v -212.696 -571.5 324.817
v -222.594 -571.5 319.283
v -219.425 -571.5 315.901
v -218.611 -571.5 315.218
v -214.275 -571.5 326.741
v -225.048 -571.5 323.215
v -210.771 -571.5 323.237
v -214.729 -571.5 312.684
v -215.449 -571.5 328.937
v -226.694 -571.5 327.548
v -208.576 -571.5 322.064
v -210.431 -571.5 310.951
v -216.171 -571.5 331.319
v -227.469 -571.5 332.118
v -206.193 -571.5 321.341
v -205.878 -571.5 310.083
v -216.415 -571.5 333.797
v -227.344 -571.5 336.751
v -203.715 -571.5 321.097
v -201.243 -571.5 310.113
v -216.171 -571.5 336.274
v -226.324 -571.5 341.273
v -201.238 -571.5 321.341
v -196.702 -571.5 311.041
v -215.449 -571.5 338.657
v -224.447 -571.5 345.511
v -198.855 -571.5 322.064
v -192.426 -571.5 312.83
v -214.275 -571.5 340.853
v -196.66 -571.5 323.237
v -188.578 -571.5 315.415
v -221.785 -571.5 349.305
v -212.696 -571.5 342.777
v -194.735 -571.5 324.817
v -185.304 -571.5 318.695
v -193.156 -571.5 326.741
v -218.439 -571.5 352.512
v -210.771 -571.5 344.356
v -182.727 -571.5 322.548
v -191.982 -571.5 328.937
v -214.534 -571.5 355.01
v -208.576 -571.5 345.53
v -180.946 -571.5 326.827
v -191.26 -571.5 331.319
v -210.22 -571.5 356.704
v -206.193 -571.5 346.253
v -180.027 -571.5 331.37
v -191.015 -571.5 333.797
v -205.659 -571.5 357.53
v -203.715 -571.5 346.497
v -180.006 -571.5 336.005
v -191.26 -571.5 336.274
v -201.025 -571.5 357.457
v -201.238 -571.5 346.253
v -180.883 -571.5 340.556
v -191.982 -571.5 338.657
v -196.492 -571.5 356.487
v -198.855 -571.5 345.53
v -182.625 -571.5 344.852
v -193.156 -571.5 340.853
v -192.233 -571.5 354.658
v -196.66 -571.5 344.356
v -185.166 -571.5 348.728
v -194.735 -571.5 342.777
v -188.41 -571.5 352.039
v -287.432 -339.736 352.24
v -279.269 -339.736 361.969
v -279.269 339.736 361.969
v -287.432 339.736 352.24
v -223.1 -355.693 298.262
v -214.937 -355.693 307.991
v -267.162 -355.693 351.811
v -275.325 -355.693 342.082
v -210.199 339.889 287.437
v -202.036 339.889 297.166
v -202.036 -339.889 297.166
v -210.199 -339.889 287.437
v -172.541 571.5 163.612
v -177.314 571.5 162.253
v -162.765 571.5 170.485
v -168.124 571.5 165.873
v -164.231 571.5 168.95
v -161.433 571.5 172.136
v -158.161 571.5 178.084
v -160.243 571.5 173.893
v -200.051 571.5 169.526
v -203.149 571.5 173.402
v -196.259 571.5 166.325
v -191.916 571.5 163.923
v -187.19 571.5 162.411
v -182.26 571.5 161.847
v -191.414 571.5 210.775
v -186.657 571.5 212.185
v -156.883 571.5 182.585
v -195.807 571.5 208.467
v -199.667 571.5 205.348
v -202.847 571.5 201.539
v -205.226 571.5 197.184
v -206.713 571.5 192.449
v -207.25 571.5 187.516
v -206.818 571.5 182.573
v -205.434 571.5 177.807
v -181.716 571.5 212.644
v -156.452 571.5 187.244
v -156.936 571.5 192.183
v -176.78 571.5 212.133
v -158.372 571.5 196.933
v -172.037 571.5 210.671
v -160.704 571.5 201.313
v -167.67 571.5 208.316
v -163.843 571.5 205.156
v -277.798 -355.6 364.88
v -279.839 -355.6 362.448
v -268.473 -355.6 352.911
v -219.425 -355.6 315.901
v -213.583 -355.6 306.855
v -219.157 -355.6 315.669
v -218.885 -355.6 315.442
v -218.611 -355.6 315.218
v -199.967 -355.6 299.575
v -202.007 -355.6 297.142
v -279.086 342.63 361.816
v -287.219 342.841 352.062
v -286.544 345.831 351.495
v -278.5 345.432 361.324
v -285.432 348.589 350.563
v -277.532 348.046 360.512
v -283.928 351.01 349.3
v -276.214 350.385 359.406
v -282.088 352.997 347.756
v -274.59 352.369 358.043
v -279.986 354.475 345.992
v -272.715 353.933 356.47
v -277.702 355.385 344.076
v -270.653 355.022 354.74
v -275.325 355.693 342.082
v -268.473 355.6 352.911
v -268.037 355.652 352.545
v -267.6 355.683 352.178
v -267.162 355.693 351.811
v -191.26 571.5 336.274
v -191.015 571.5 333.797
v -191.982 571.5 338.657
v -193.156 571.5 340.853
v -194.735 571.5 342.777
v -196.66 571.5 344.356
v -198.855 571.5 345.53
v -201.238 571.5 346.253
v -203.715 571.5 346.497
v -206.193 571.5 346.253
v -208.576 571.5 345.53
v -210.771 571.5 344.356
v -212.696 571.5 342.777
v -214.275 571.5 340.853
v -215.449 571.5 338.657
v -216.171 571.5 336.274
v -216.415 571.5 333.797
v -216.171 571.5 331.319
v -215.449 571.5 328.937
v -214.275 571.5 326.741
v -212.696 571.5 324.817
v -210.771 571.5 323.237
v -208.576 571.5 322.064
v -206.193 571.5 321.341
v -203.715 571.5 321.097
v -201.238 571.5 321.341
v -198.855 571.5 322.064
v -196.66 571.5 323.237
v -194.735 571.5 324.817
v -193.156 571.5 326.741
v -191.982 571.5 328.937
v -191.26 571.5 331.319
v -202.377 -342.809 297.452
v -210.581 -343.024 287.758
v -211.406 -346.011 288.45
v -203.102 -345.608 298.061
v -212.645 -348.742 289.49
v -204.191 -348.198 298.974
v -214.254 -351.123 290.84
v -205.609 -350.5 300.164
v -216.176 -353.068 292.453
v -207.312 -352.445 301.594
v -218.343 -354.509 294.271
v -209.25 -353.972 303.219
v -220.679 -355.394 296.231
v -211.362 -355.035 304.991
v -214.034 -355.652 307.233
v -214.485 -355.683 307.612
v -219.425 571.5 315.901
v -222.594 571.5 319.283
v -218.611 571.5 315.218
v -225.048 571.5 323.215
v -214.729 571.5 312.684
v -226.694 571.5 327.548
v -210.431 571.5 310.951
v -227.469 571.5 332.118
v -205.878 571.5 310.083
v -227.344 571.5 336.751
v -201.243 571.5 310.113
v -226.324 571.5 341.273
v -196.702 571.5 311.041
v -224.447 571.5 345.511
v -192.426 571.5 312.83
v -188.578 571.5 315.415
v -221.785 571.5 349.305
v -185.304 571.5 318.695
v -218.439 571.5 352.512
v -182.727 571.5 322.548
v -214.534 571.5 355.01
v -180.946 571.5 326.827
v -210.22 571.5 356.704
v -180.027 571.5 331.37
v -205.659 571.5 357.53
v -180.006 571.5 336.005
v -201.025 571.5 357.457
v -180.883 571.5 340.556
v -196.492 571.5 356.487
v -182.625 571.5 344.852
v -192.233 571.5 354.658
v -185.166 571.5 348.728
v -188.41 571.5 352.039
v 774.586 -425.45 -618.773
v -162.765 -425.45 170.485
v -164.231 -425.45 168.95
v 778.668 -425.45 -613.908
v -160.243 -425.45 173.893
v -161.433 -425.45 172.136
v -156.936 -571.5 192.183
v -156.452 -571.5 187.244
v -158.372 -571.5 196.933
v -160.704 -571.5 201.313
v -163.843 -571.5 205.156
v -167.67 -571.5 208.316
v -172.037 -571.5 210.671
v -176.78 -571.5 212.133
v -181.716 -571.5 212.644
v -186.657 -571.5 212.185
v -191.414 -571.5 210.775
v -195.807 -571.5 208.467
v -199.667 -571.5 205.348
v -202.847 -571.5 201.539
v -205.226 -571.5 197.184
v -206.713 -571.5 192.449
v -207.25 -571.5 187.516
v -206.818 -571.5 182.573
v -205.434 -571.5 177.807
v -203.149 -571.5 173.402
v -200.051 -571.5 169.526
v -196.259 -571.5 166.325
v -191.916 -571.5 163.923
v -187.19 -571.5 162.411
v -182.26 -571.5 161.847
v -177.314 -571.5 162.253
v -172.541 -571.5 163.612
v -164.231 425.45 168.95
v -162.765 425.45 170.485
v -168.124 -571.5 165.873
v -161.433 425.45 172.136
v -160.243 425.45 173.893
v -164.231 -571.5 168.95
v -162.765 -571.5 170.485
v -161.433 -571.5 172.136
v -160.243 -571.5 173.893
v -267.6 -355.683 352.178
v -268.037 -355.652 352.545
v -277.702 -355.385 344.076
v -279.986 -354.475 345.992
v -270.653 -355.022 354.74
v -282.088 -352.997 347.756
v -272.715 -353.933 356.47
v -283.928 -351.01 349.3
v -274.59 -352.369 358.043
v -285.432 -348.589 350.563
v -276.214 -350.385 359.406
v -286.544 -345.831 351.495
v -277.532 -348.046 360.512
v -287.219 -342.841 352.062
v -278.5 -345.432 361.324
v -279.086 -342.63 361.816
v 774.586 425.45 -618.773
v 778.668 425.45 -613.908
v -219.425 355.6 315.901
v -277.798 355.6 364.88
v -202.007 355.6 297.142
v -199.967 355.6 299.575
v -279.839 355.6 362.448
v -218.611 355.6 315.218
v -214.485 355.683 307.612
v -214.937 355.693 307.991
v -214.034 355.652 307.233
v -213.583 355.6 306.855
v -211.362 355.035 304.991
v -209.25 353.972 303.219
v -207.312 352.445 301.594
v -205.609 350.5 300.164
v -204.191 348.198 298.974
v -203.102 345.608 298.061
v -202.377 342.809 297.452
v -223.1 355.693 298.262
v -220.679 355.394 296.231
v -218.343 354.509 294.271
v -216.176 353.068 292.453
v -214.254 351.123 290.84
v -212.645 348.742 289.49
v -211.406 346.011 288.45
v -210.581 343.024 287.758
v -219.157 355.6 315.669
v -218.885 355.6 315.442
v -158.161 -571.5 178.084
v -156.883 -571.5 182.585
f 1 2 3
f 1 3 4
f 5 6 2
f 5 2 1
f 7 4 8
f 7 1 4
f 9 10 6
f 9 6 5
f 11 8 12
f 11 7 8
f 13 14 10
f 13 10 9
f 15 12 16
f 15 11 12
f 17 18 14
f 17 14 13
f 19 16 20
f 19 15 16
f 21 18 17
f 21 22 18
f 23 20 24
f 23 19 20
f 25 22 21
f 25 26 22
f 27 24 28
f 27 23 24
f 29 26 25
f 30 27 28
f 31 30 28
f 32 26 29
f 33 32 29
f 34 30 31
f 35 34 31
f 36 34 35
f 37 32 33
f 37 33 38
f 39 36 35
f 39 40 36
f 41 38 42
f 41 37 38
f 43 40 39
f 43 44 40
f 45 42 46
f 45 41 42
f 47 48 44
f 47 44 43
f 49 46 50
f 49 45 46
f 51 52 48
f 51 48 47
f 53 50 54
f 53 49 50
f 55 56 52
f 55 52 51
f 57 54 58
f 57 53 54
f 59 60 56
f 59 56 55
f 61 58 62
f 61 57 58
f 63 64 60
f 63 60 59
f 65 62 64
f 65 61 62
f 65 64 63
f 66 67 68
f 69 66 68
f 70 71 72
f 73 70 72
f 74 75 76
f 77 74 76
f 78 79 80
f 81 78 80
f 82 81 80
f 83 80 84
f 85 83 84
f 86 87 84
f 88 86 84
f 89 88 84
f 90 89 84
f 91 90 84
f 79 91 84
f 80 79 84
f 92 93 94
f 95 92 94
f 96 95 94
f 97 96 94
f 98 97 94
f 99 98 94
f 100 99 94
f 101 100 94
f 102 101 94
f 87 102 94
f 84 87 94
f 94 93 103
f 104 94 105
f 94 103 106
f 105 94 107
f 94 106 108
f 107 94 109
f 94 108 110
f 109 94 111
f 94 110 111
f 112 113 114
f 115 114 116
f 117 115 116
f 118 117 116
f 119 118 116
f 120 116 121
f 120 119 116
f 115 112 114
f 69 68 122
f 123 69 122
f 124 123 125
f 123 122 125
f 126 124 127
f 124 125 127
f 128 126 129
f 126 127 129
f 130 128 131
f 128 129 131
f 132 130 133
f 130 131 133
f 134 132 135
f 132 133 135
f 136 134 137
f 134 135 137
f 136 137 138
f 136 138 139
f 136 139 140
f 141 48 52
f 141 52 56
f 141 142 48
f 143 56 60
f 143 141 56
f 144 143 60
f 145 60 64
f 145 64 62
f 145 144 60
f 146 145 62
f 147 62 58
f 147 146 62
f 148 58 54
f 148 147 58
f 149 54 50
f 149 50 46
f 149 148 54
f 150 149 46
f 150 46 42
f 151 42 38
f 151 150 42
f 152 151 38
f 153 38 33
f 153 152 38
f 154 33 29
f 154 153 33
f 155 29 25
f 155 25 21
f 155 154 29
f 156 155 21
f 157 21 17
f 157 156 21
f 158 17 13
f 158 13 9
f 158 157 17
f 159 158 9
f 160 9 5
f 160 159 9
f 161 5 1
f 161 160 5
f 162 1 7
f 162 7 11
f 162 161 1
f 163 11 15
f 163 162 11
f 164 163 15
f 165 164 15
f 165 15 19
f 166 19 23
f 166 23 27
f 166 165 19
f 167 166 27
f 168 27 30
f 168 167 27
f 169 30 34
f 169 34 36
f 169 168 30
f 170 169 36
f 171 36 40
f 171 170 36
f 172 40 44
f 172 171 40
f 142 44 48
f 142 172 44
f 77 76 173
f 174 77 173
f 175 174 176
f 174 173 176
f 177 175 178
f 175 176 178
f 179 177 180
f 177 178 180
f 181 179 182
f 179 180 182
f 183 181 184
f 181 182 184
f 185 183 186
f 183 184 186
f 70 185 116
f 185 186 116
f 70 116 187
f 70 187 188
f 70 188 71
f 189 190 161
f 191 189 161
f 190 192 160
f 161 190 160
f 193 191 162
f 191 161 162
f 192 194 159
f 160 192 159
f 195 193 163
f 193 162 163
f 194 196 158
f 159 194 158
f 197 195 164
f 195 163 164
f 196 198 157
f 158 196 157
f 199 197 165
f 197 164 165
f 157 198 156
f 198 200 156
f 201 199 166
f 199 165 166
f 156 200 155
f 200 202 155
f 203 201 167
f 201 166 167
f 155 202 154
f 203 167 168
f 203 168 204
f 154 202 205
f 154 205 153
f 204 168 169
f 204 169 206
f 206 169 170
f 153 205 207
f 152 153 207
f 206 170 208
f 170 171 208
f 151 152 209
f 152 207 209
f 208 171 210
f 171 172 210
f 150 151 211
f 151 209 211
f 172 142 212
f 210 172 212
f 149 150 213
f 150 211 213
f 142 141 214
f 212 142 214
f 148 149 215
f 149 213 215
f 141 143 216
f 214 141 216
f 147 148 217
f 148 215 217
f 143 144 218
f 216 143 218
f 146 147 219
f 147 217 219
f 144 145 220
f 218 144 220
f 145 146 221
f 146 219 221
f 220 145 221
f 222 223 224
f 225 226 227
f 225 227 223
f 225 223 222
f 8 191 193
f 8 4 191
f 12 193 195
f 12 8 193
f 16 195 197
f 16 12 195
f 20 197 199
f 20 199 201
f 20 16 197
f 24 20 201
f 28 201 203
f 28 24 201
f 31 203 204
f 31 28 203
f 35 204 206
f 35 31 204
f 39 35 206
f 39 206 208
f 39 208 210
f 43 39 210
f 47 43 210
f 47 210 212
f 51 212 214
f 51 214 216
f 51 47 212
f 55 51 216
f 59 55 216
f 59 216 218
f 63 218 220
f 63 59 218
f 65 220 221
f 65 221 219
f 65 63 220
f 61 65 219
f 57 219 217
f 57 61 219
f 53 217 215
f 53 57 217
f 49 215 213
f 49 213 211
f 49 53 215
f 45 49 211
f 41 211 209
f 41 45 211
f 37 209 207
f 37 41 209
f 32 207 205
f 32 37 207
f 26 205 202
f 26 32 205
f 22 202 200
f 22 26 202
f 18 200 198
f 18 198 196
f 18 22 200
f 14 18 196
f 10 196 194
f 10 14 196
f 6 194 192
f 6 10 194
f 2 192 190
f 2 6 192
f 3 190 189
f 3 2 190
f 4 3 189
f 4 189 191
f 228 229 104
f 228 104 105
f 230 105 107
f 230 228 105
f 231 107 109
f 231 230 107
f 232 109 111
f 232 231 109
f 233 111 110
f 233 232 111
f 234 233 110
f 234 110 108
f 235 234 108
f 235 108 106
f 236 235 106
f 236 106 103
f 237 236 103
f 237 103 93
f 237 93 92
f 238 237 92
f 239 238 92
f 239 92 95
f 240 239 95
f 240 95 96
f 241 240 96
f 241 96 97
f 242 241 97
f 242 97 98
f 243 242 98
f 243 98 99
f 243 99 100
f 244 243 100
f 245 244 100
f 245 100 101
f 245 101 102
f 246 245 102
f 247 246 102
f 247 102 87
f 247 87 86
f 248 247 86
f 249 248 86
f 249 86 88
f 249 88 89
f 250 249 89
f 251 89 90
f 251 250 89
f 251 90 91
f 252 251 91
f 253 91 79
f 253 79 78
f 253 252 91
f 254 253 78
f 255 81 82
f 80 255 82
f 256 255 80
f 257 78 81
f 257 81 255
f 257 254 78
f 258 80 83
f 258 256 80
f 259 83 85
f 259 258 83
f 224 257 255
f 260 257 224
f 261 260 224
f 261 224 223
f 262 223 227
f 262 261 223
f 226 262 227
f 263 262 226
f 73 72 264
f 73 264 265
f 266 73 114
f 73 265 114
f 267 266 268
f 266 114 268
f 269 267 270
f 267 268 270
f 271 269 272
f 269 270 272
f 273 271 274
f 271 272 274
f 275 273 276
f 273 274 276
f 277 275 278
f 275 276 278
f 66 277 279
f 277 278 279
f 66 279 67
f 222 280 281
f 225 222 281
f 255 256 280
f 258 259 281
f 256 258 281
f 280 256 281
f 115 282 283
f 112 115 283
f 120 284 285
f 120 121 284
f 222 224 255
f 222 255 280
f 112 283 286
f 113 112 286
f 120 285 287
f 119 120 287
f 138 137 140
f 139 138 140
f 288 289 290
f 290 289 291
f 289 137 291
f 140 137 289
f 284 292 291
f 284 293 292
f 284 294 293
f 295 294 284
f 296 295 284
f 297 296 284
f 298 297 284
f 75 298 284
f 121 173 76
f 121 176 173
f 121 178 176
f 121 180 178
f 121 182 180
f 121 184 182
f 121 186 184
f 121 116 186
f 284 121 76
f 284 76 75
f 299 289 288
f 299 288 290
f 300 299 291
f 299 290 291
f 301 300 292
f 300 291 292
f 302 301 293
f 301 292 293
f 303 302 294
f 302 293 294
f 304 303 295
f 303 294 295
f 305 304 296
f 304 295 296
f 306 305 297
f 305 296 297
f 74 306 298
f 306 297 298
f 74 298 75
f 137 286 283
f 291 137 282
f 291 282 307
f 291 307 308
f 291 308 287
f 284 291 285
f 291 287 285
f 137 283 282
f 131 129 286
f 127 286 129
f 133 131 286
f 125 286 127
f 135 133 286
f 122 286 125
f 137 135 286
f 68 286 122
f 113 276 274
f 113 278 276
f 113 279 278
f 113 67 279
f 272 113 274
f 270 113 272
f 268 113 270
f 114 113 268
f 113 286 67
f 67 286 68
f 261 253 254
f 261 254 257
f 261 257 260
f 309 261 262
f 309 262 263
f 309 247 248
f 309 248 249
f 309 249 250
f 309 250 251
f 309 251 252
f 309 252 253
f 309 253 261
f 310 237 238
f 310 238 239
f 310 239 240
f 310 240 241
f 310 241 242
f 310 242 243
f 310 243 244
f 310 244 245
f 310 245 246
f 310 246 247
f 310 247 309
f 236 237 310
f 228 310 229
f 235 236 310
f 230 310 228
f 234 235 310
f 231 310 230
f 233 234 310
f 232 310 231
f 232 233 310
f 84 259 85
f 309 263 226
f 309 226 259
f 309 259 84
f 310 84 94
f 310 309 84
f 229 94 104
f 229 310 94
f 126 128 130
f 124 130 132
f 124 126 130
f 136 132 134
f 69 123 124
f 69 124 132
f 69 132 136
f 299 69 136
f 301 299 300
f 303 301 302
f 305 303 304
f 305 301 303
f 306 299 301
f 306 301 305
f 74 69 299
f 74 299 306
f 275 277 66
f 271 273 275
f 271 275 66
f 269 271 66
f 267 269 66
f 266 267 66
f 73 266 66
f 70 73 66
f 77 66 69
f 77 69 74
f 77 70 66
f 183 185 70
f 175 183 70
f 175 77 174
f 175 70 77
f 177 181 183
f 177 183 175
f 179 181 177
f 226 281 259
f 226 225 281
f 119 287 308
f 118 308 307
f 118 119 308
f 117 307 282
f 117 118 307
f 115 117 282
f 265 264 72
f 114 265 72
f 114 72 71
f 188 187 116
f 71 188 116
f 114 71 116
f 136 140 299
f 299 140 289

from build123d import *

# Parameters (mm, degrees)
F1_DEPTH = 425.45
F2_DEPTH = 571.5
F0_R     = 12.7
F3_DEPTH = 571.5
F4_DEPTH = 355.6
F7_DEPTH = 12.7


with BuildPart() as f1:
    # F0 (on Front) → F1 (new body, symmetric)
    with BuildSketch(Plane.XZ):
        with BuildLine():
            Line((778.6675206466, -613.9081587448), (-160.2433607585, 173.8933208623))
            ThreePointArc((-160.2433607585, 173.8933208623), (-162.0820566689, 171.296534145), (-164.2309846977, 168.9500021864))
            Line((-164.2309846977, 168.9500021864), (774.5859357546, -618.7726386522))
            Line((774.5859357546, -618.7726386522), (778.6675206466, -613.9081587448))
        make_face()
    extrude(amount=F1_DEPTH, both=True)

    # F0 (on Front) → F2 (join, symmetric)
    with BuildSketch(Plane.XZ):
        with BuildLine():
            Line((-160.2433607585, 173.8933208623), (-179.4952093534, 190.0467547063))
            Line((-179.4952093534, 190.0467547063), (-183.5905268279, 185.1937972437))
            Line((-183.5905268279, 185.1937972437), (-164.2309846977, 168.9500021864))
            ThreePointArc((-164.2309846977, 168.9500021864), (-162.0820566689, 171.296534145), (-160.2433607585, 173.8933208623))
        make_face()
        with BuildLine():
            Line((-183.5905268279, 185.1937972437), (-179.4952093534, 190.0467547063))
            Line((-179.4952093534, 190.0467547063), (-160.2433607585, 173.8933208623))
            ThreePointArc((-160.2433607585, 173.8933208623), (-157.417954, 180.3046887728), (-156.4516437276, 187.2440551914))
            ThreePointArc((-156.4516437276, 187.2440551914), (-205.226039328, 197.1837549012), (-164.2309846977, 168.9500021864))
            Line((-164.2309846977, 168.9500021864), (-183.5905268279, 185.1937972437))
        make_face()
    extrude(amount=F2_DEPTH, both=True)


with BuildPart() as f3:
    # F0 (on Front) → F3 (new body, symmetric)
    with BuildSketch(Plane.XZ):
        with BuildLine():
            ThreePointArc((-218.6106479033, 315.2180612468), (-193.4114979992, 312.3290577694), (-179.9029731282, 333.7967836106))
            ThreePointArc((-179.9029731282, 333.7967836106), (-213.5379568757, 355.4890395855), (-219.4245663487, 315.9009867174))
            Line((-219.4245663487, 315.9009867174), (-218.6106479033, 315.2180612468))
        make_face()
        with Locations((-203.7154731282, 333.7967836106)):
            Circle(F0_R, mode=Mode.SUBTRACT)
    extrude(amount=F3_DEPTH, both=True)


with BuildPart() as f4:
    # F0 (on Front) → F4 (new body, symmetric)
    with BuildSketch(Plane.XZ):
        with BuildLine():
            ThreePointArc((-218.6106479033, 315.2180612468), (-219.0214164734, 315.554983958), (-219.4245663487, 315.9009867174))
            Line((-219.4245663487, 315.9009867174), (-277.7983252369, 364.8800054221))
            Line((-277.7983252369, 364.8800054221), (-279.8391176829, 362.4477654684))
            Line((-279.8391176829, 362.4477654684), (-202.0074391654, 297.1424071956))
            Line((-202.0074391654, 297.1424071956), (-199.9666467193, 299.5746471492))
            Line((-199.9666467193, 299.5746471492), (-218.6106479033, 315.2180612468))
        make_face()
    extrude(amount=F4_DEPTH, both=True)

    # F6 (on offset) → F7 (join)
    with BuildSketch(Plane(origin=(62.8529918179, 0, 74.9089199174), x_dir=(0.7660598279, 0, -0.6427692743), z_dir=(-0.6427692743, 0, -0.7660598279))):
        with BuildLine():
            Line((-362.6220535138, 355.692833662), (-430.795699358, 355.692833662))
            ThreePointArc((-430.795699358, 355.692833662), (-442.0247912115, 351.0097832174), (-446.5991332871, 339.7359702024))
            Line((-446.5991332871, 339.7359702024), (-446.5991332871, -339.7359702024))
            ThreePointArc((-446.5991332871, -339.7359702024), (-442.0247912115, -351.0097832174), (-430.795699358, -355.692833662))
            Line((-430.795699358, -355.692833662), (-362.6220535138, -355.692833662))
            ThreePointArc((-362.6220535138, -355.692833662), (-351.074322037, -351.1230481675), (-345.7807777227, -339.8886620998))
            Line((-345.7807777227, -339.8886620998), (-345.7807777227, 339.8886620998))
            ThreePointArc((-345.7807777227, 339.8886620998), (-351.074322037, 351.1230481675), (-362.6220535138, 355.692833662))
        make_face()
    extrude(amount=F7_DEPTH)


solid = Compound([f1.part, f3.part, f4.part])
